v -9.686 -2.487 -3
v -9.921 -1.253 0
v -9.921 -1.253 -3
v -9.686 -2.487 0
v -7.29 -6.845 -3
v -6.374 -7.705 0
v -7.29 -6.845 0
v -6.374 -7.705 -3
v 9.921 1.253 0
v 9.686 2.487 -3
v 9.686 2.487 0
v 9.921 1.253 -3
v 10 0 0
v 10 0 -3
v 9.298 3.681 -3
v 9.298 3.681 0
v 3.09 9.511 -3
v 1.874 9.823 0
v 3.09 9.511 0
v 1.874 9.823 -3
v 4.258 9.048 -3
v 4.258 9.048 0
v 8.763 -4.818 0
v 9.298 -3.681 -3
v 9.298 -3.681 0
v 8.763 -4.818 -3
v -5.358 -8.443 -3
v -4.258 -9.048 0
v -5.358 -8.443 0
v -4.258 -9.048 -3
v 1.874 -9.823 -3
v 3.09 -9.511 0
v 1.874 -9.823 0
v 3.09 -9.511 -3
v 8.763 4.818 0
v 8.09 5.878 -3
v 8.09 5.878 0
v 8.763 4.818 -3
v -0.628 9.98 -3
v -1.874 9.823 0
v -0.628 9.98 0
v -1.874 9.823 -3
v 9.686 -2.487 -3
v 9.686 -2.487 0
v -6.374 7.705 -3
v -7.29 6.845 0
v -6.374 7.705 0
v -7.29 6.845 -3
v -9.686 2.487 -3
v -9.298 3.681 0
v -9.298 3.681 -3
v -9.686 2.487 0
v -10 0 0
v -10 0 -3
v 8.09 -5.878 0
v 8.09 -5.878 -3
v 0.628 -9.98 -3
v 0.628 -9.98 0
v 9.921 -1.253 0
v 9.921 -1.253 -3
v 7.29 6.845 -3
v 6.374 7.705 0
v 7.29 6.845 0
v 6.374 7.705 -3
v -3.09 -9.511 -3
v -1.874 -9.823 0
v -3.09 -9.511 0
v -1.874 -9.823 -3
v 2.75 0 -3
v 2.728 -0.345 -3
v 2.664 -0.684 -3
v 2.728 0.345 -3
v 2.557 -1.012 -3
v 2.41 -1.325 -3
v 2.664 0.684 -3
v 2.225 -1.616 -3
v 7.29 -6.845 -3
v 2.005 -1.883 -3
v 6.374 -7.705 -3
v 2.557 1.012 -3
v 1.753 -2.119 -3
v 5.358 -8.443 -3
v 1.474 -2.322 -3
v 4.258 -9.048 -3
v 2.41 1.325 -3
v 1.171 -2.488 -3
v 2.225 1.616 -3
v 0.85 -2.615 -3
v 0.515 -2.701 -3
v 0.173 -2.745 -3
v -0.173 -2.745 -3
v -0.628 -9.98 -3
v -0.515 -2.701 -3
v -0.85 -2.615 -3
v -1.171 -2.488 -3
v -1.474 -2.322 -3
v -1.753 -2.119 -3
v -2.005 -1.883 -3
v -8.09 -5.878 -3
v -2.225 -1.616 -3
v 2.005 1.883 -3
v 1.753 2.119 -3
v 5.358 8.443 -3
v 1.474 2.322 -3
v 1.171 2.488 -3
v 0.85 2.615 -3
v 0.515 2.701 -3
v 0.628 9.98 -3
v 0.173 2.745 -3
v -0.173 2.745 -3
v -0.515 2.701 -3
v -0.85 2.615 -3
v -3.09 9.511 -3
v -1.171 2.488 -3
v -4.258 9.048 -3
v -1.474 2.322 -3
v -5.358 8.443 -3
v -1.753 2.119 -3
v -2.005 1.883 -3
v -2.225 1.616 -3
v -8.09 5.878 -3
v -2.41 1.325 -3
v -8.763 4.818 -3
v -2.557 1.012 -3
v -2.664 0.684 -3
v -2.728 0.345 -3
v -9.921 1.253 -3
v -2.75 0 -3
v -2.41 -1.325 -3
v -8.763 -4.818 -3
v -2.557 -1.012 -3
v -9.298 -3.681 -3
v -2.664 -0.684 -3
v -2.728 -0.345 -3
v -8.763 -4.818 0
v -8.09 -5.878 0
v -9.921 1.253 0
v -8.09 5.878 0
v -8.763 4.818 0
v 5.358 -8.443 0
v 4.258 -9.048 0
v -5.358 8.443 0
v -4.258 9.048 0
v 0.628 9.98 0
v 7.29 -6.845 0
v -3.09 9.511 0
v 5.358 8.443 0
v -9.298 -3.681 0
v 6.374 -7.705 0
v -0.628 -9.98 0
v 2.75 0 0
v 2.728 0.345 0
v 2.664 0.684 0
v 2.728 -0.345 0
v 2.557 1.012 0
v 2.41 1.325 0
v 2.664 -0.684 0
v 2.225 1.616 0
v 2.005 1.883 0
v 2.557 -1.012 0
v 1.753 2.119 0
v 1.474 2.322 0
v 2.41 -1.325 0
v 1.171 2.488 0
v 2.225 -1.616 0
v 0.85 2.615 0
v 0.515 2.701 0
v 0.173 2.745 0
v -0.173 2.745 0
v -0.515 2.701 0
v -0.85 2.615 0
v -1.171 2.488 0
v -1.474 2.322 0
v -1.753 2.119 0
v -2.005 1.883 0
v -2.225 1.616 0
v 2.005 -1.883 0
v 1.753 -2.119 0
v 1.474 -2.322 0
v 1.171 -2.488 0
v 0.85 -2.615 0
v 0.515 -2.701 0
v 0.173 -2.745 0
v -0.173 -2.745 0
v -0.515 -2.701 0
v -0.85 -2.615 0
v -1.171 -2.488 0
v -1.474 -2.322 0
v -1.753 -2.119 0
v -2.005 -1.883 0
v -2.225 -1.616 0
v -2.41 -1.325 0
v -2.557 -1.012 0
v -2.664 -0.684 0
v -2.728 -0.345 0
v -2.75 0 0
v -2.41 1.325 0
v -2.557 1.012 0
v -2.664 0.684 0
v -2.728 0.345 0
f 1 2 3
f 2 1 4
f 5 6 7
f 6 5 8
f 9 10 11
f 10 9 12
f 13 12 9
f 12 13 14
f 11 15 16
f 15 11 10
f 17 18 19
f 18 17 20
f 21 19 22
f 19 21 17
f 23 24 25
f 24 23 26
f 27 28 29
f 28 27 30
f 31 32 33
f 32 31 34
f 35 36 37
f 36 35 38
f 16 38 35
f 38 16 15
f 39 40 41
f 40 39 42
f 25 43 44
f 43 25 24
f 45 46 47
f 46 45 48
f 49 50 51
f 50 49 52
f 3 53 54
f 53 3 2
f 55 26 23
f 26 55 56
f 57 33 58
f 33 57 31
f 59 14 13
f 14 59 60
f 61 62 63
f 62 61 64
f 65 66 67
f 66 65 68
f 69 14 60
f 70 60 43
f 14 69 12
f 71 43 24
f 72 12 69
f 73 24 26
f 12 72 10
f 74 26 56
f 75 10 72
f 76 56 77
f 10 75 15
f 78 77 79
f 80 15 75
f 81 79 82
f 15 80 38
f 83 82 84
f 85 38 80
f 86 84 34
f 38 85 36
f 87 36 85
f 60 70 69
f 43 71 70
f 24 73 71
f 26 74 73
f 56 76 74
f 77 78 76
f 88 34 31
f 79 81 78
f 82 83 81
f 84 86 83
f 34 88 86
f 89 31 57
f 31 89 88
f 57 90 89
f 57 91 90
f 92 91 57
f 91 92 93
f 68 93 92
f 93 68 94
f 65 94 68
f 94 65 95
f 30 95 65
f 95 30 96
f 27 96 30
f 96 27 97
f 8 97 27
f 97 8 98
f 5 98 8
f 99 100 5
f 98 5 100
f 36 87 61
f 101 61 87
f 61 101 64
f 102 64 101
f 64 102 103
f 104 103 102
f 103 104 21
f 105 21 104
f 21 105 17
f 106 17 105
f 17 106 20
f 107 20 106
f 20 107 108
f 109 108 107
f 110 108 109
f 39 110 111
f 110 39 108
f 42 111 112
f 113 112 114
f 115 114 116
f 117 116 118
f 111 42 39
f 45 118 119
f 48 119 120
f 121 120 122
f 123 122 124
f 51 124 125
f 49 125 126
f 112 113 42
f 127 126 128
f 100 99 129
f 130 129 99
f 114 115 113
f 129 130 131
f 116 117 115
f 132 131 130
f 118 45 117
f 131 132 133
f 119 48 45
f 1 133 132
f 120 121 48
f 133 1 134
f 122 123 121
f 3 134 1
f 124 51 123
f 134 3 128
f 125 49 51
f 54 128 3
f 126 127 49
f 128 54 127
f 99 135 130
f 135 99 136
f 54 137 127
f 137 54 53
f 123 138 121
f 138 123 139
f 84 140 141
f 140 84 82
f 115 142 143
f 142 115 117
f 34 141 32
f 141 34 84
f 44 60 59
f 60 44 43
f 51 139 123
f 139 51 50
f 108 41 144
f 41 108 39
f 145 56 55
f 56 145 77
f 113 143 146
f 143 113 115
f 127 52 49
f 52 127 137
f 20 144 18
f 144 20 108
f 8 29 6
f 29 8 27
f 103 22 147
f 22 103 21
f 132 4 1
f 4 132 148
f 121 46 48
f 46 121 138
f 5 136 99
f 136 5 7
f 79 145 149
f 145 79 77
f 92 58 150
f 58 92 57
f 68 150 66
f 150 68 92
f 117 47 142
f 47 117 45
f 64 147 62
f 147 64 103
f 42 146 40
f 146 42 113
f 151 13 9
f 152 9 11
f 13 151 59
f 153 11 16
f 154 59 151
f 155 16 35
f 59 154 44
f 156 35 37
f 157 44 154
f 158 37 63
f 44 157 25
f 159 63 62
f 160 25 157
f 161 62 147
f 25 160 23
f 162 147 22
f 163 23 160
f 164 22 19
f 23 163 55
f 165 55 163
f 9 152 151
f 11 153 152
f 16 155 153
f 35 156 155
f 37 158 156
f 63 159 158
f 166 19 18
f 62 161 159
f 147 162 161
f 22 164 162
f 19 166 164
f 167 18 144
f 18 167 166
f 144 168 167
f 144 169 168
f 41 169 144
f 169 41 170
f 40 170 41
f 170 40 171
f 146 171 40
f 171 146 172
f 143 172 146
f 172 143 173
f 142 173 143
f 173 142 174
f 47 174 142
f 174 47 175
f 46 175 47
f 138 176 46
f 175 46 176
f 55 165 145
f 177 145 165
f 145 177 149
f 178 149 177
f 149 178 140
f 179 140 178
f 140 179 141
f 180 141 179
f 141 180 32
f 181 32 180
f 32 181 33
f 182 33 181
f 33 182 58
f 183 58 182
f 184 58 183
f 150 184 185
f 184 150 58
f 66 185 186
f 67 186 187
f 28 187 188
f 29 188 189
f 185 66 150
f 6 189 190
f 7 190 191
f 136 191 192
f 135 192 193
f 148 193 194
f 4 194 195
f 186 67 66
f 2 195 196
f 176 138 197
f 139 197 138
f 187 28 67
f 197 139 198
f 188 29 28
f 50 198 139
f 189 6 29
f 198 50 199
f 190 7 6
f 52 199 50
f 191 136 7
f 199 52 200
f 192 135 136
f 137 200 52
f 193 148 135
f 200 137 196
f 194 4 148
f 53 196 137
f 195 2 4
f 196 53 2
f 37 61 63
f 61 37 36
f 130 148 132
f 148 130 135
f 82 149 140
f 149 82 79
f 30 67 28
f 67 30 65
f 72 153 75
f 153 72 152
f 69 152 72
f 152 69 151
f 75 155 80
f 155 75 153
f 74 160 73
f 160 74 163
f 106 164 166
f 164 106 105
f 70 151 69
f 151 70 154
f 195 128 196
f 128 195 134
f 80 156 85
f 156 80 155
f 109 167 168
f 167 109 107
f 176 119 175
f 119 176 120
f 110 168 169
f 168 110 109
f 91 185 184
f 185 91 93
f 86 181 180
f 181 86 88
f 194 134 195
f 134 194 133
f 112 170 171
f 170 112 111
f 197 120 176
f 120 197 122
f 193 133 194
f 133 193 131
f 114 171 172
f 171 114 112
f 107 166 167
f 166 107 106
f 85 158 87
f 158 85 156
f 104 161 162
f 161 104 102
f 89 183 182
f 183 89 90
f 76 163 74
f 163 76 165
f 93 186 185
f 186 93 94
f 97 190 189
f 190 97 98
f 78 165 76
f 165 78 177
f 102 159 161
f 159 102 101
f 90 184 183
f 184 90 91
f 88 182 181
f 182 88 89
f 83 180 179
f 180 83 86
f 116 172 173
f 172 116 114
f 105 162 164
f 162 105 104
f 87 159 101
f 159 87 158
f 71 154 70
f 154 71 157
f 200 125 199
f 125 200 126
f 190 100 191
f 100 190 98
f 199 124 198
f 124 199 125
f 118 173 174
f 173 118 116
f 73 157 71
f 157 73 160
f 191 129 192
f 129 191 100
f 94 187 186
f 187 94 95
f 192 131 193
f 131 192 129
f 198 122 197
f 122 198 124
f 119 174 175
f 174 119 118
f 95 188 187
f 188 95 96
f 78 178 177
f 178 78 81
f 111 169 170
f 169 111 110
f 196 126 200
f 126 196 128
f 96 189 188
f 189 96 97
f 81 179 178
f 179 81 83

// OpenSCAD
$fn = 50;


difference() {
	union() {
		translate(v = [0, 0, -3.0000000000]) {
			cylinder(h = 3, r = 10.0000000000);
		}
		cylinder(h = 0, r = 19.0000000000);
	}
	union() {
		#translate(v = [0, 0, -3]) {
			cylinder(h = 3, r = 2.7500000000);
		}
	}
}
